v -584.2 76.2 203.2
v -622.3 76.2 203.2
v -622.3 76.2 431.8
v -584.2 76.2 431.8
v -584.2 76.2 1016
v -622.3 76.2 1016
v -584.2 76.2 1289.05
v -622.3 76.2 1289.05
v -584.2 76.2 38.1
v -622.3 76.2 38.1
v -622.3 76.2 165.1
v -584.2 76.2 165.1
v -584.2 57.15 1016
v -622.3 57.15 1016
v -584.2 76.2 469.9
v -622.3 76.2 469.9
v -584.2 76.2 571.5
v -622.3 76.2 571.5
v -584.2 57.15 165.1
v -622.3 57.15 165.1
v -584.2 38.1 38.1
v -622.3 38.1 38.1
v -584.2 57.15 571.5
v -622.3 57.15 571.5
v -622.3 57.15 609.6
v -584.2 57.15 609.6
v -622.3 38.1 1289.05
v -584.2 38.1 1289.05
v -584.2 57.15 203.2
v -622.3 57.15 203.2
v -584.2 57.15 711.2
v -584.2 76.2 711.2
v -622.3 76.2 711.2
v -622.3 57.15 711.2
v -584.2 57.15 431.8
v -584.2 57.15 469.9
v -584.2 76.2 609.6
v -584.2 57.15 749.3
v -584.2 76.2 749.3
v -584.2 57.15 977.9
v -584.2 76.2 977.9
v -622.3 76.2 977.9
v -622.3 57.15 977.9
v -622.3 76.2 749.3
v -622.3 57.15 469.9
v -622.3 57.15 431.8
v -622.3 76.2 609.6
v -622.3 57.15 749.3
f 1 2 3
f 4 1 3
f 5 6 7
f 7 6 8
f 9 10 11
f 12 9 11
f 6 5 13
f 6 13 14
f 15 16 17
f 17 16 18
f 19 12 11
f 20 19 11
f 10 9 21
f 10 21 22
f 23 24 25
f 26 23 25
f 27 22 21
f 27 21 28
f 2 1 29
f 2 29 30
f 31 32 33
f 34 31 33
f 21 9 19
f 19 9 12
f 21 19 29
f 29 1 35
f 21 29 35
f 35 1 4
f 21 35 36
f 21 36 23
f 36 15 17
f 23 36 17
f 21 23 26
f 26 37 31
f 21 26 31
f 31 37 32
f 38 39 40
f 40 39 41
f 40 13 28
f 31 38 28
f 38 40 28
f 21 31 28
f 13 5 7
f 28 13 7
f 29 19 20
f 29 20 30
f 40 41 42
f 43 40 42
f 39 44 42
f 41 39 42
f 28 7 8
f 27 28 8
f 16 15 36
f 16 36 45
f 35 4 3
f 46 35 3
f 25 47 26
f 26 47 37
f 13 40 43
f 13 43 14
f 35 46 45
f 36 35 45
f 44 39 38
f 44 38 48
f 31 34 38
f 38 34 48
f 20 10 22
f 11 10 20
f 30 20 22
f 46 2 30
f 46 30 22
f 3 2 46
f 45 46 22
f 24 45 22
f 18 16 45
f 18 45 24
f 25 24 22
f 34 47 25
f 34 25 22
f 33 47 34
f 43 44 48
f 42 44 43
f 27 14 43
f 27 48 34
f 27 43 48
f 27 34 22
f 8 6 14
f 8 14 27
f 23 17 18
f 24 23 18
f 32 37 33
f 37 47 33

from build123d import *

# Parameters (mm, degrees)
F1_DEPTH = 19.05
F0_W     = 228.6
F0_H     = 38.1
F0_W_2   = 273.05
F0_W_3   = 101.6
F0_W_4   = 127
F2_W     = 1250.95
F2_H     = 38.1
F3_DEPTH = 19.05
F5_ANGLE = 90
F6_ANGLE = 90


with BuildPart() as f1:
    # F0 (on Top) → F1 (new body)
    with BuildSketch(Plane.XY):
        Polygon((-50.8, 0), (0, 0), (50.8, 0), (50.8, 38.1), (-50.8, 38.1), align=None)
    extrude(amount=F1_DEPTH)


with BuildPart() as f1b:
    # F0 (on Top) → F1, piece 2 (new body)
    with BuildSketch(Plane.XY):
        with Locations((203.2, 19.05)):
            Rectangle(F0_W, F0_H)
    extrude(amount=F1_DEPTH)


with BuildPart() as f1c:
    # F0 (on Top) → F1, piece 3 (new body)
    with BuildSketch(Plane.XY):
        with Locations((492.125, 19.05)):
            Rectangle(F0_W_2, F0_H)
    extrude(amount=F1_DEPTH)


with BuildPart() as f1d:
    # F0 (on Top) → F1, piece 4 (new body)
    with BuildSketch(Plane.XY):
        with Locations((-139.7, 19.05)):
            Rectangle(F0_W_3, F0_H)
    extrude(amount=F1_DEPTH)


with BuildPart() as f1e:
    # F0 (on Top) → F1, piece 5 (new body)
    with BuildSketch(Plane.XY):
        with Locations((-342.9, 19.05)):
            Rectangle(F0_W, F0_H)
    extrude(amount=F1_DEPTH)


with BuildPart() as f1f:
    # F0 (on Top) → F1, piece 6 (new body)
    with BuildSketch(Plane.XY):
        with Locations((-558.8, 19.05)):
            Rectangle(F0_W_4, F0_H)
    extrude(amount=F1_DEPTH)


with BuildPart() as f3:
    # F2 (on face) → F3 (new body)
    with BuildSketch(Plane.XY.offset(19.05)):
        with Locations((3.175, 19.05)):
            Rectangle(F2_W, F2_H)
    extrude(amount=F3_DEPTH)

    # F4: union F1, F1b, F1c, F1d, F1e, F1f
    add(f1.part)
    add(f1b.part)
    add(f1c.part)
    add(f1d.part)
    add(f1e.part)
    add(f1f.part)


with BuildPart() as f3_1:
    # F5: moved
    add(f3.part.rotate(Axis((-622.3, 19.05, 38.1), (0, -1, 0)), F5_ANGLE))


with BuildPart() as f3_2:
    # F6: moved
    add(f3_1.part.rotate(Axis((-622.3, 38.1, 663.575), (0, 0, 1)), F6_ANGLE))


solid = f3_2.part
